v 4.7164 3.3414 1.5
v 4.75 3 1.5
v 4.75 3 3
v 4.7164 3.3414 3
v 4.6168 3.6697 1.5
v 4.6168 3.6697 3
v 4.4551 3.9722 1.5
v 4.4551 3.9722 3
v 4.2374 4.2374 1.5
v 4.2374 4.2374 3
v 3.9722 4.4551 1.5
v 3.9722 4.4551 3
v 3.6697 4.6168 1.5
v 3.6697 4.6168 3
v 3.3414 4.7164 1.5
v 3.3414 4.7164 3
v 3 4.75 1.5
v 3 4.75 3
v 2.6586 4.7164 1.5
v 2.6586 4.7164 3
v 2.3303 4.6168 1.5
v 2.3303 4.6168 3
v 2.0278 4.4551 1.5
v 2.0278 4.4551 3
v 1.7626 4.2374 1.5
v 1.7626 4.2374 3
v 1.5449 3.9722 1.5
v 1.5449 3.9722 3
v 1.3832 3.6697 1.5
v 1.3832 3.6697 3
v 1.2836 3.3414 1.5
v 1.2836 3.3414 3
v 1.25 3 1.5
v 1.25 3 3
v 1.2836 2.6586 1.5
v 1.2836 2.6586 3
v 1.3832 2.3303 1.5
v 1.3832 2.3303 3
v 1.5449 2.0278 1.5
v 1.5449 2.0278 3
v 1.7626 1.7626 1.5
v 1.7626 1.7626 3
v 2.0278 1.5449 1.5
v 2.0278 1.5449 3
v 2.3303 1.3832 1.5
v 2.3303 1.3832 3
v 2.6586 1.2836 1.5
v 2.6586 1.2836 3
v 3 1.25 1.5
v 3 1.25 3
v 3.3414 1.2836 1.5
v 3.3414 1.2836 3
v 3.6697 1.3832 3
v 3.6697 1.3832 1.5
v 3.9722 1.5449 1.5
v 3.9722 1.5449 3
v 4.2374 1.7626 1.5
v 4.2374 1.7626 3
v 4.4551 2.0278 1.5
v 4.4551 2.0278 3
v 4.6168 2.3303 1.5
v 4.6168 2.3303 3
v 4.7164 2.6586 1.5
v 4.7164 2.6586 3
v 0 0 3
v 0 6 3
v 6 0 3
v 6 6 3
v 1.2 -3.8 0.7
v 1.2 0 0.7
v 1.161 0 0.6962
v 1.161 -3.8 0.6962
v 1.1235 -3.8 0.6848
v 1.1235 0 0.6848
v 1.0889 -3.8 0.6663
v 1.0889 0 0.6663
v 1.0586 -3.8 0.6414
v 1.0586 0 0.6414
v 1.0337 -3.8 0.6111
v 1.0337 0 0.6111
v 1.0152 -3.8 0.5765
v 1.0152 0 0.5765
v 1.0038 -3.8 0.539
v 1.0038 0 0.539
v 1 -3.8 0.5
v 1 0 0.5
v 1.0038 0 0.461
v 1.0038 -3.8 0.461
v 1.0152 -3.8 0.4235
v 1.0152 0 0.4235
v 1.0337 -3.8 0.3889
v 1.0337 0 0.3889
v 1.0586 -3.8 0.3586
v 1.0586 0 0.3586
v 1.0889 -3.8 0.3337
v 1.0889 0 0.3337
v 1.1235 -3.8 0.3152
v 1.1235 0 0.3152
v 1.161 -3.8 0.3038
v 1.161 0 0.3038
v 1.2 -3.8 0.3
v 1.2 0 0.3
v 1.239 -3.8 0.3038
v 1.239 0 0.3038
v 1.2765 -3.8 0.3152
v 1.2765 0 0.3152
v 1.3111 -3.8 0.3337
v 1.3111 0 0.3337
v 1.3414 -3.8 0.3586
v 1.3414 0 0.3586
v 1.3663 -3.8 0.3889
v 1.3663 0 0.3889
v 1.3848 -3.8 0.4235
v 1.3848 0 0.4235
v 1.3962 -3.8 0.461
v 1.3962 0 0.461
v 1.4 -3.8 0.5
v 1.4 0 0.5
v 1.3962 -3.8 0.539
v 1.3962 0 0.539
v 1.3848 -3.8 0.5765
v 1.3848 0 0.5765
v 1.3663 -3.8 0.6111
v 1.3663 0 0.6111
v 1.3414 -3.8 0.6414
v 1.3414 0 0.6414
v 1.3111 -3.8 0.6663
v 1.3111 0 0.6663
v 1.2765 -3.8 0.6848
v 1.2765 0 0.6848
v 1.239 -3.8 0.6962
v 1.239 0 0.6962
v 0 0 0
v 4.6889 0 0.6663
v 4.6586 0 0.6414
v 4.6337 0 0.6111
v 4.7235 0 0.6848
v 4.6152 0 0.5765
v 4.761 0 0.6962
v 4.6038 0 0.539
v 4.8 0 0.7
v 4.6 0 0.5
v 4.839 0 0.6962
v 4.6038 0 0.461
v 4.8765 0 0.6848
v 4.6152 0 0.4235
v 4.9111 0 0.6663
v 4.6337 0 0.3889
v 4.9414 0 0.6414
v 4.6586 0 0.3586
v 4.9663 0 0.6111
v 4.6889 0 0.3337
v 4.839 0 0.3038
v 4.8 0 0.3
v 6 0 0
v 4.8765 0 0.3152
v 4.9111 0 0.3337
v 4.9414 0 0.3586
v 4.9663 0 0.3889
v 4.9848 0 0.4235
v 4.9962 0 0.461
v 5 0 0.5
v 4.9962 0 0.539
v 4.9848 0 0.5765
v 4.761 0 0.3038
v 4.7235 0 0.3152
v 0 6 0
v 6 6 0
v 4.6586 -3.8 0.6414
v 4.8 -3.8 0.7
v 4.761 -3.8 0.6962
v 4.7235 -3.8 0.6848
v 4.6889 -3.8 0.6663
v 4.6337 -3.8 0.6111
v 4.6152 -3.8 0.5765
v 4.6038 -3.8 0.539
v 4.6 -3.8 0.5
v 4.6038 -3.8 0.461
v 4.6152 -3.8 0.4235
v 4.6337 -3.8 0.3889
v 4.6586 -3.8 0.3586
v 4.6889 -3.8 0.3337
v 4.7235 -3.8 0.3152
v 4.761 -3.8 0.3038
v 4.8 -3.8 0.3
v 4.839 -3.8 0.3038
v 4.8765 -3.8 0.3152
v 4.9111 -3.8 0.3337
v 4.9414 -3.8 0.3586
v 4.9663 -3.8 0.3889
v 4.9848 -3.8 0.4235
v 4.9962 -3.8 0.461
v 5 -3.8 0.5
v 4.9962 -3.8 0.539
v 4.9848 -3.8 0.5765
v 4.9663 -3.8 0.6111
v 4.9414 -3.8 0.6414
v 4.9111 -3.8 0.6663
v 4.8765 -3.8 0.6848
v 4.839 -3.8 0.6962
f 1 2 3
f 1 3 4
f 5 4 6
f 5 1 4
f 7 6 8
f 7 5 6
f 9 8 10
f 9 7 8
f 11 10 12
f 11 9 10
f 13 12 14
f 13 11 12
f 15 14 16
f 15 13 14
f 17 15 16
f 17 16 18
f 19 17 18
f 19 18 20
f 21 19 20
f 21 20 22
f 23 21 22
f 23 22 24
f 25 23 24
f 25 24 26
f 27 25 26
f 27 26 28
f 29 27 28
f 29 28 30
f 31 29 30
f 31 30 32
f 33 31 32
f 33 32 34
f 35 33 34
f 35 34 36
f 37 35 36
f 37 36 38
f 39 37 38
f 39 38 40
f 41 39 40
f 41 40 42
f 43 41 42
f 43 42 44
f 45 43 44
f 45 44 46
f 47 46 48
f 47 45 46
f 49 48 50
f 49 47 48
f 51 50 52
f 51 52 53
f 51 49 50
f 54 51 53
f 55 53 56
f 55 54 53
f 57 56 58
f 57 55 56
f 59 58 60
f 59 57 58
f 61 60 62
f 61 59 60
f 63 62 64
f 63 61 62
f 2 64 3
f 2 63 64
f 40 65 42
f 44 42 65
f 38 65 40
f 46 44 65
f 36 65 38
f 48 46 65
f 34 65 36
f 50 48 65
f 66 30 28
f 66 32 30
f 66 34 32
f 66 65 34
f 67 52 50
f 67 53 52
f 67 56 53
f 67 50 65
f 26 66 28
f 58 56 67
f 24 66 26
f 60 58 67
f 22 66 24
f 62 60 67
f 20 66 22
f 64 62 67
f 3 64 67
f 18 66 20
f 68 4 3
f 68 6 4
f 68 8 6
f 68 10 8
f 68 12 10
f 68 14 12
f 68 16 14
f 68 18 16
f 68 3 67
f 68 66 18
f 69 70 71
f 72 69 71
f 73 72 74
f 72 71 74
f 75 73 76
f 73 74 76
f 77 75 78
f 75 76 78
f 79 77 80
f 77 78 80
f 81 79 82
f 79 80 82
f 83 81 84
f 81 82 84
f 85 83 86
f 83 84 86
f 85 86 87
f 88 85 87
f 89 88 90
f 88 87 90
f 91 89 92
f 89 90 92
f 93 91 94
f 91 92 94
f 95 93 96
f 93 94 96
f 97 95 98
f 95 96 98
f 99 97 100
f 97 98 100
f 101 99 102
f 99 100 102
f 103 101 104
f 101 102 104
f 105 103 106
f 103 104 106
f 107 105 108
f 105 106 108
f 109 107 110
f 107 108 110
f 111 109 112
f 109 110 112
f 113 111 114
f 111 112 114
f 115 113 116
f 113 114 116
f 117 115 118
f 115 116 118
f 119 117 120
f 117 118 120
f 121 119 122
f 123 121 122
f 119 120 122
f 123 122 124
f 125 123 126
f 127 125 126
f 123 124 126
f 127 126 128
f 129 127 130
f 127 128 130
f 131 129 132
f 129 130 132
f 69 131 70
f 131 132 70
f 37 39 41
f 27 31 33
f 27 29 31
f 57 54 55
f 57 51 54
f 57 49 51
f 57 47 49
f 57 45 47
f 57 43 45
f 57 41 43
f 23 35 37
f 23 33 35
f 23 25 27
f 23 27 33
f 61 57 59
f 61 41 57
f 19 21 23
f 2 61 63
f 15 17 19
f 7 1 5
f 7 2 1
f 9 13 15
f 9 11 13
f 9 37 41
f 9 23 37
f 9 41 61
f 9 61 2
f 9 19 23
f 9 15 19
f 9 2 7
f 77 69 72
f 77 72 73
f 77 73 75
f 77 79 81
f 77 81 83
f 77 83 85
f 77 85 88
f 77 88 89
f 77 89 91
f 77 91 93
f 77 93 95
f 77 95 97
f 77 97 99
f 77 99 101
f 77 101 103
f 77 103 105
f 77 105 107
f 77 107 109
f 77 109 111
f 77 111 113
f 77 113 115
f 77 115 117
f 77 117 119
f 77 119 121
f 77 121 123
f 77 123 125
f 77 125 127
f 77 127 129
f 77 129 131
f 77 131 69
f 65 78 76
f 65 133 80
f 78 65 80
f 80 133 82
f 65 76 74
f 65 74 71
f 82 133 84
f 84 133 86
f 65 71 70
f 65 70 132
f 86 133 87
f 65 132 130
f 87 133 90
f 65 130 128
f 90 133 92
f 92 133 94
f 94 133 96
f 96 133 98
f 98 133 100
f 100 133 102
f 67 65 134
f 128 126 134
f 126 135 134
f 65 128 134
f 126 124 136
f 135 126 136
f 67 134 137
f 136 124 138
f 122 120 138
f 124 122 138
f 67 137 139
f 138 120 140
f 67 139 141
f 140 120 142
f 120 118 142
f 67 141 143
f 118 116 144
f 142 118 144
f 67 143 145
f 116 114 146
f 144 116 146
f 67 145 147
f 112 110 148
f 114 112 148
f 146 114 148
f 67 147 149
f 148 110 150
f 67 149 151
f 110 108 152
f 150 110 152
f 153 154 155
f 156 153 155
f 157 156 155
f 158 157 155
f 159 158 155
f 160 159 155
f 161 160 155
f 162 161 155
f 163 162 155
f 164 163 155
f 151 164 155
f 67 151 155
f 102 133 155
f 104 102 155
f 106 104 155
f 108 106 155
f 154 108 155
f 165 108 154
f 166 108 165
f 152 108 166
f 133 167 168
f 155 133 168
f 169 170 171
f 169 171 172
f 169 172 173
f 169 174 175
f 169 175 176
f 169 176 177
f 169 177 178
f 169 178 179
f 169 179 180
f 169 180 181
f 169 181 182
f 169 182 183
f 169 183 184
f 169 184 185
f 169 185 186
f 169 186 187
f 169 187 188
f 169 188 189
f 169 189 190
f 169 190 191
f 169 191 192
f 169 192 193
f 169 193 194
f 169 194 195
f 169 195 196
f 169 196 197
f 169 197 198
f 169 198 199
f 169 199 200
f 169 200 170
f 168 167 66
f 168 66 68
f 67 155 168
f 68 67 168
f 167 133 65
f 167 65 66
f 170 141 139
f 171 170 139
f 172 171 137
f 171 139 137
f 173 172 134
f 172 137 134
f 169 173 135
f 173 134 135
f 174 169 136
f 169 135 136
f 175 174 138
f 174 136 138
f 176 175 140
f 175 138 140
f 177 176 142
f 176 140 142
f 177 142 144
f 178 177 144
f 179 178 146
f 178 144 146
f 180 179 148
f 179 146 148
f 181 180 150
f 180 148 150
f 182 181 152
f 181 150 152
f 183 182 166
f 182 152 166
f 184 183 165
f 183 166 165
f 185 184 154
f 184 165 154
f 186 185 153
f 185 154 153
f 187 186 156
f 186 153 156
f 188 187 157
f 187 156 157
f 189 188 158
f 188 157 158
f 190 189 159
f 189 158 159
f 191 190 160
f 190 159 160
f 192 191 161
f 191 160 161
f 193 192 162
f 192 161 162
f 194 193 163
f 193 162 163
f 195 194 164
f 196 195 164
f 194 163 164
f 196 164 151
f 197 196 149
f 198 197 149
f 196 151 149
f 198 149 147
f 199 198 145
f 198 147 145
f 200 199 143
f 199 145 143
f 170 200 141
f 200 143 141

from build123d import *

# Parameters (mm, degrees)
SKETCH1_W           = 6
SKETCH1_H           = 6
SKETCH1_R           = 1.75
BOSS_EXTRUDE1_DEPTH = 3
SKETCH2_W           = 6
SKETCH2_H           = 6
BOSS_EXTRUDE2_DEPTH = 1.5
SKETCH3_R           = 0.2
BOSS_EXTRUDE3_DEPTH = 3.8


with BuildPart() as part:
    # Sketch1 → Boss-Extrude1 (new body)
    with BuildSketch(Plane.XY):
        with Locations((3, 3)):
            Rectangle(SKETCH1_W, SKETCH1_H)
        with Locations((3, 3)):
            Circle(SKETCH1_R, mode=Mode.SUBTRACT)
    extrude(amount=BOSS_EXTRUDE1_DEPTH)

    # Sketch2 → Boss-Extrude2 (add)
    with BuildSketch(Plane.XY):
        with Locations((3, 3)):
            Rectangle(SKETCH2_W, SKETCH2_H)
    extrude(amount=BOSS_EXTRUDE2_DEPTH)

    # Sketch3 → Boss-Extrude3 (add)
    with BuildSketch(Plane.XZ):
        with Locations(Location((1.2, 0.5, 0), (0, 0, 90))):
            Circle(SKETCH3_R)
        with Locations(Location((4.8, 0.5, 0), (0, 0, 90))):
            Circle(SKETCH3_R)
    extrude(amount=BOSS_EXTRUDE3_DEPTH)


solid = part.part
